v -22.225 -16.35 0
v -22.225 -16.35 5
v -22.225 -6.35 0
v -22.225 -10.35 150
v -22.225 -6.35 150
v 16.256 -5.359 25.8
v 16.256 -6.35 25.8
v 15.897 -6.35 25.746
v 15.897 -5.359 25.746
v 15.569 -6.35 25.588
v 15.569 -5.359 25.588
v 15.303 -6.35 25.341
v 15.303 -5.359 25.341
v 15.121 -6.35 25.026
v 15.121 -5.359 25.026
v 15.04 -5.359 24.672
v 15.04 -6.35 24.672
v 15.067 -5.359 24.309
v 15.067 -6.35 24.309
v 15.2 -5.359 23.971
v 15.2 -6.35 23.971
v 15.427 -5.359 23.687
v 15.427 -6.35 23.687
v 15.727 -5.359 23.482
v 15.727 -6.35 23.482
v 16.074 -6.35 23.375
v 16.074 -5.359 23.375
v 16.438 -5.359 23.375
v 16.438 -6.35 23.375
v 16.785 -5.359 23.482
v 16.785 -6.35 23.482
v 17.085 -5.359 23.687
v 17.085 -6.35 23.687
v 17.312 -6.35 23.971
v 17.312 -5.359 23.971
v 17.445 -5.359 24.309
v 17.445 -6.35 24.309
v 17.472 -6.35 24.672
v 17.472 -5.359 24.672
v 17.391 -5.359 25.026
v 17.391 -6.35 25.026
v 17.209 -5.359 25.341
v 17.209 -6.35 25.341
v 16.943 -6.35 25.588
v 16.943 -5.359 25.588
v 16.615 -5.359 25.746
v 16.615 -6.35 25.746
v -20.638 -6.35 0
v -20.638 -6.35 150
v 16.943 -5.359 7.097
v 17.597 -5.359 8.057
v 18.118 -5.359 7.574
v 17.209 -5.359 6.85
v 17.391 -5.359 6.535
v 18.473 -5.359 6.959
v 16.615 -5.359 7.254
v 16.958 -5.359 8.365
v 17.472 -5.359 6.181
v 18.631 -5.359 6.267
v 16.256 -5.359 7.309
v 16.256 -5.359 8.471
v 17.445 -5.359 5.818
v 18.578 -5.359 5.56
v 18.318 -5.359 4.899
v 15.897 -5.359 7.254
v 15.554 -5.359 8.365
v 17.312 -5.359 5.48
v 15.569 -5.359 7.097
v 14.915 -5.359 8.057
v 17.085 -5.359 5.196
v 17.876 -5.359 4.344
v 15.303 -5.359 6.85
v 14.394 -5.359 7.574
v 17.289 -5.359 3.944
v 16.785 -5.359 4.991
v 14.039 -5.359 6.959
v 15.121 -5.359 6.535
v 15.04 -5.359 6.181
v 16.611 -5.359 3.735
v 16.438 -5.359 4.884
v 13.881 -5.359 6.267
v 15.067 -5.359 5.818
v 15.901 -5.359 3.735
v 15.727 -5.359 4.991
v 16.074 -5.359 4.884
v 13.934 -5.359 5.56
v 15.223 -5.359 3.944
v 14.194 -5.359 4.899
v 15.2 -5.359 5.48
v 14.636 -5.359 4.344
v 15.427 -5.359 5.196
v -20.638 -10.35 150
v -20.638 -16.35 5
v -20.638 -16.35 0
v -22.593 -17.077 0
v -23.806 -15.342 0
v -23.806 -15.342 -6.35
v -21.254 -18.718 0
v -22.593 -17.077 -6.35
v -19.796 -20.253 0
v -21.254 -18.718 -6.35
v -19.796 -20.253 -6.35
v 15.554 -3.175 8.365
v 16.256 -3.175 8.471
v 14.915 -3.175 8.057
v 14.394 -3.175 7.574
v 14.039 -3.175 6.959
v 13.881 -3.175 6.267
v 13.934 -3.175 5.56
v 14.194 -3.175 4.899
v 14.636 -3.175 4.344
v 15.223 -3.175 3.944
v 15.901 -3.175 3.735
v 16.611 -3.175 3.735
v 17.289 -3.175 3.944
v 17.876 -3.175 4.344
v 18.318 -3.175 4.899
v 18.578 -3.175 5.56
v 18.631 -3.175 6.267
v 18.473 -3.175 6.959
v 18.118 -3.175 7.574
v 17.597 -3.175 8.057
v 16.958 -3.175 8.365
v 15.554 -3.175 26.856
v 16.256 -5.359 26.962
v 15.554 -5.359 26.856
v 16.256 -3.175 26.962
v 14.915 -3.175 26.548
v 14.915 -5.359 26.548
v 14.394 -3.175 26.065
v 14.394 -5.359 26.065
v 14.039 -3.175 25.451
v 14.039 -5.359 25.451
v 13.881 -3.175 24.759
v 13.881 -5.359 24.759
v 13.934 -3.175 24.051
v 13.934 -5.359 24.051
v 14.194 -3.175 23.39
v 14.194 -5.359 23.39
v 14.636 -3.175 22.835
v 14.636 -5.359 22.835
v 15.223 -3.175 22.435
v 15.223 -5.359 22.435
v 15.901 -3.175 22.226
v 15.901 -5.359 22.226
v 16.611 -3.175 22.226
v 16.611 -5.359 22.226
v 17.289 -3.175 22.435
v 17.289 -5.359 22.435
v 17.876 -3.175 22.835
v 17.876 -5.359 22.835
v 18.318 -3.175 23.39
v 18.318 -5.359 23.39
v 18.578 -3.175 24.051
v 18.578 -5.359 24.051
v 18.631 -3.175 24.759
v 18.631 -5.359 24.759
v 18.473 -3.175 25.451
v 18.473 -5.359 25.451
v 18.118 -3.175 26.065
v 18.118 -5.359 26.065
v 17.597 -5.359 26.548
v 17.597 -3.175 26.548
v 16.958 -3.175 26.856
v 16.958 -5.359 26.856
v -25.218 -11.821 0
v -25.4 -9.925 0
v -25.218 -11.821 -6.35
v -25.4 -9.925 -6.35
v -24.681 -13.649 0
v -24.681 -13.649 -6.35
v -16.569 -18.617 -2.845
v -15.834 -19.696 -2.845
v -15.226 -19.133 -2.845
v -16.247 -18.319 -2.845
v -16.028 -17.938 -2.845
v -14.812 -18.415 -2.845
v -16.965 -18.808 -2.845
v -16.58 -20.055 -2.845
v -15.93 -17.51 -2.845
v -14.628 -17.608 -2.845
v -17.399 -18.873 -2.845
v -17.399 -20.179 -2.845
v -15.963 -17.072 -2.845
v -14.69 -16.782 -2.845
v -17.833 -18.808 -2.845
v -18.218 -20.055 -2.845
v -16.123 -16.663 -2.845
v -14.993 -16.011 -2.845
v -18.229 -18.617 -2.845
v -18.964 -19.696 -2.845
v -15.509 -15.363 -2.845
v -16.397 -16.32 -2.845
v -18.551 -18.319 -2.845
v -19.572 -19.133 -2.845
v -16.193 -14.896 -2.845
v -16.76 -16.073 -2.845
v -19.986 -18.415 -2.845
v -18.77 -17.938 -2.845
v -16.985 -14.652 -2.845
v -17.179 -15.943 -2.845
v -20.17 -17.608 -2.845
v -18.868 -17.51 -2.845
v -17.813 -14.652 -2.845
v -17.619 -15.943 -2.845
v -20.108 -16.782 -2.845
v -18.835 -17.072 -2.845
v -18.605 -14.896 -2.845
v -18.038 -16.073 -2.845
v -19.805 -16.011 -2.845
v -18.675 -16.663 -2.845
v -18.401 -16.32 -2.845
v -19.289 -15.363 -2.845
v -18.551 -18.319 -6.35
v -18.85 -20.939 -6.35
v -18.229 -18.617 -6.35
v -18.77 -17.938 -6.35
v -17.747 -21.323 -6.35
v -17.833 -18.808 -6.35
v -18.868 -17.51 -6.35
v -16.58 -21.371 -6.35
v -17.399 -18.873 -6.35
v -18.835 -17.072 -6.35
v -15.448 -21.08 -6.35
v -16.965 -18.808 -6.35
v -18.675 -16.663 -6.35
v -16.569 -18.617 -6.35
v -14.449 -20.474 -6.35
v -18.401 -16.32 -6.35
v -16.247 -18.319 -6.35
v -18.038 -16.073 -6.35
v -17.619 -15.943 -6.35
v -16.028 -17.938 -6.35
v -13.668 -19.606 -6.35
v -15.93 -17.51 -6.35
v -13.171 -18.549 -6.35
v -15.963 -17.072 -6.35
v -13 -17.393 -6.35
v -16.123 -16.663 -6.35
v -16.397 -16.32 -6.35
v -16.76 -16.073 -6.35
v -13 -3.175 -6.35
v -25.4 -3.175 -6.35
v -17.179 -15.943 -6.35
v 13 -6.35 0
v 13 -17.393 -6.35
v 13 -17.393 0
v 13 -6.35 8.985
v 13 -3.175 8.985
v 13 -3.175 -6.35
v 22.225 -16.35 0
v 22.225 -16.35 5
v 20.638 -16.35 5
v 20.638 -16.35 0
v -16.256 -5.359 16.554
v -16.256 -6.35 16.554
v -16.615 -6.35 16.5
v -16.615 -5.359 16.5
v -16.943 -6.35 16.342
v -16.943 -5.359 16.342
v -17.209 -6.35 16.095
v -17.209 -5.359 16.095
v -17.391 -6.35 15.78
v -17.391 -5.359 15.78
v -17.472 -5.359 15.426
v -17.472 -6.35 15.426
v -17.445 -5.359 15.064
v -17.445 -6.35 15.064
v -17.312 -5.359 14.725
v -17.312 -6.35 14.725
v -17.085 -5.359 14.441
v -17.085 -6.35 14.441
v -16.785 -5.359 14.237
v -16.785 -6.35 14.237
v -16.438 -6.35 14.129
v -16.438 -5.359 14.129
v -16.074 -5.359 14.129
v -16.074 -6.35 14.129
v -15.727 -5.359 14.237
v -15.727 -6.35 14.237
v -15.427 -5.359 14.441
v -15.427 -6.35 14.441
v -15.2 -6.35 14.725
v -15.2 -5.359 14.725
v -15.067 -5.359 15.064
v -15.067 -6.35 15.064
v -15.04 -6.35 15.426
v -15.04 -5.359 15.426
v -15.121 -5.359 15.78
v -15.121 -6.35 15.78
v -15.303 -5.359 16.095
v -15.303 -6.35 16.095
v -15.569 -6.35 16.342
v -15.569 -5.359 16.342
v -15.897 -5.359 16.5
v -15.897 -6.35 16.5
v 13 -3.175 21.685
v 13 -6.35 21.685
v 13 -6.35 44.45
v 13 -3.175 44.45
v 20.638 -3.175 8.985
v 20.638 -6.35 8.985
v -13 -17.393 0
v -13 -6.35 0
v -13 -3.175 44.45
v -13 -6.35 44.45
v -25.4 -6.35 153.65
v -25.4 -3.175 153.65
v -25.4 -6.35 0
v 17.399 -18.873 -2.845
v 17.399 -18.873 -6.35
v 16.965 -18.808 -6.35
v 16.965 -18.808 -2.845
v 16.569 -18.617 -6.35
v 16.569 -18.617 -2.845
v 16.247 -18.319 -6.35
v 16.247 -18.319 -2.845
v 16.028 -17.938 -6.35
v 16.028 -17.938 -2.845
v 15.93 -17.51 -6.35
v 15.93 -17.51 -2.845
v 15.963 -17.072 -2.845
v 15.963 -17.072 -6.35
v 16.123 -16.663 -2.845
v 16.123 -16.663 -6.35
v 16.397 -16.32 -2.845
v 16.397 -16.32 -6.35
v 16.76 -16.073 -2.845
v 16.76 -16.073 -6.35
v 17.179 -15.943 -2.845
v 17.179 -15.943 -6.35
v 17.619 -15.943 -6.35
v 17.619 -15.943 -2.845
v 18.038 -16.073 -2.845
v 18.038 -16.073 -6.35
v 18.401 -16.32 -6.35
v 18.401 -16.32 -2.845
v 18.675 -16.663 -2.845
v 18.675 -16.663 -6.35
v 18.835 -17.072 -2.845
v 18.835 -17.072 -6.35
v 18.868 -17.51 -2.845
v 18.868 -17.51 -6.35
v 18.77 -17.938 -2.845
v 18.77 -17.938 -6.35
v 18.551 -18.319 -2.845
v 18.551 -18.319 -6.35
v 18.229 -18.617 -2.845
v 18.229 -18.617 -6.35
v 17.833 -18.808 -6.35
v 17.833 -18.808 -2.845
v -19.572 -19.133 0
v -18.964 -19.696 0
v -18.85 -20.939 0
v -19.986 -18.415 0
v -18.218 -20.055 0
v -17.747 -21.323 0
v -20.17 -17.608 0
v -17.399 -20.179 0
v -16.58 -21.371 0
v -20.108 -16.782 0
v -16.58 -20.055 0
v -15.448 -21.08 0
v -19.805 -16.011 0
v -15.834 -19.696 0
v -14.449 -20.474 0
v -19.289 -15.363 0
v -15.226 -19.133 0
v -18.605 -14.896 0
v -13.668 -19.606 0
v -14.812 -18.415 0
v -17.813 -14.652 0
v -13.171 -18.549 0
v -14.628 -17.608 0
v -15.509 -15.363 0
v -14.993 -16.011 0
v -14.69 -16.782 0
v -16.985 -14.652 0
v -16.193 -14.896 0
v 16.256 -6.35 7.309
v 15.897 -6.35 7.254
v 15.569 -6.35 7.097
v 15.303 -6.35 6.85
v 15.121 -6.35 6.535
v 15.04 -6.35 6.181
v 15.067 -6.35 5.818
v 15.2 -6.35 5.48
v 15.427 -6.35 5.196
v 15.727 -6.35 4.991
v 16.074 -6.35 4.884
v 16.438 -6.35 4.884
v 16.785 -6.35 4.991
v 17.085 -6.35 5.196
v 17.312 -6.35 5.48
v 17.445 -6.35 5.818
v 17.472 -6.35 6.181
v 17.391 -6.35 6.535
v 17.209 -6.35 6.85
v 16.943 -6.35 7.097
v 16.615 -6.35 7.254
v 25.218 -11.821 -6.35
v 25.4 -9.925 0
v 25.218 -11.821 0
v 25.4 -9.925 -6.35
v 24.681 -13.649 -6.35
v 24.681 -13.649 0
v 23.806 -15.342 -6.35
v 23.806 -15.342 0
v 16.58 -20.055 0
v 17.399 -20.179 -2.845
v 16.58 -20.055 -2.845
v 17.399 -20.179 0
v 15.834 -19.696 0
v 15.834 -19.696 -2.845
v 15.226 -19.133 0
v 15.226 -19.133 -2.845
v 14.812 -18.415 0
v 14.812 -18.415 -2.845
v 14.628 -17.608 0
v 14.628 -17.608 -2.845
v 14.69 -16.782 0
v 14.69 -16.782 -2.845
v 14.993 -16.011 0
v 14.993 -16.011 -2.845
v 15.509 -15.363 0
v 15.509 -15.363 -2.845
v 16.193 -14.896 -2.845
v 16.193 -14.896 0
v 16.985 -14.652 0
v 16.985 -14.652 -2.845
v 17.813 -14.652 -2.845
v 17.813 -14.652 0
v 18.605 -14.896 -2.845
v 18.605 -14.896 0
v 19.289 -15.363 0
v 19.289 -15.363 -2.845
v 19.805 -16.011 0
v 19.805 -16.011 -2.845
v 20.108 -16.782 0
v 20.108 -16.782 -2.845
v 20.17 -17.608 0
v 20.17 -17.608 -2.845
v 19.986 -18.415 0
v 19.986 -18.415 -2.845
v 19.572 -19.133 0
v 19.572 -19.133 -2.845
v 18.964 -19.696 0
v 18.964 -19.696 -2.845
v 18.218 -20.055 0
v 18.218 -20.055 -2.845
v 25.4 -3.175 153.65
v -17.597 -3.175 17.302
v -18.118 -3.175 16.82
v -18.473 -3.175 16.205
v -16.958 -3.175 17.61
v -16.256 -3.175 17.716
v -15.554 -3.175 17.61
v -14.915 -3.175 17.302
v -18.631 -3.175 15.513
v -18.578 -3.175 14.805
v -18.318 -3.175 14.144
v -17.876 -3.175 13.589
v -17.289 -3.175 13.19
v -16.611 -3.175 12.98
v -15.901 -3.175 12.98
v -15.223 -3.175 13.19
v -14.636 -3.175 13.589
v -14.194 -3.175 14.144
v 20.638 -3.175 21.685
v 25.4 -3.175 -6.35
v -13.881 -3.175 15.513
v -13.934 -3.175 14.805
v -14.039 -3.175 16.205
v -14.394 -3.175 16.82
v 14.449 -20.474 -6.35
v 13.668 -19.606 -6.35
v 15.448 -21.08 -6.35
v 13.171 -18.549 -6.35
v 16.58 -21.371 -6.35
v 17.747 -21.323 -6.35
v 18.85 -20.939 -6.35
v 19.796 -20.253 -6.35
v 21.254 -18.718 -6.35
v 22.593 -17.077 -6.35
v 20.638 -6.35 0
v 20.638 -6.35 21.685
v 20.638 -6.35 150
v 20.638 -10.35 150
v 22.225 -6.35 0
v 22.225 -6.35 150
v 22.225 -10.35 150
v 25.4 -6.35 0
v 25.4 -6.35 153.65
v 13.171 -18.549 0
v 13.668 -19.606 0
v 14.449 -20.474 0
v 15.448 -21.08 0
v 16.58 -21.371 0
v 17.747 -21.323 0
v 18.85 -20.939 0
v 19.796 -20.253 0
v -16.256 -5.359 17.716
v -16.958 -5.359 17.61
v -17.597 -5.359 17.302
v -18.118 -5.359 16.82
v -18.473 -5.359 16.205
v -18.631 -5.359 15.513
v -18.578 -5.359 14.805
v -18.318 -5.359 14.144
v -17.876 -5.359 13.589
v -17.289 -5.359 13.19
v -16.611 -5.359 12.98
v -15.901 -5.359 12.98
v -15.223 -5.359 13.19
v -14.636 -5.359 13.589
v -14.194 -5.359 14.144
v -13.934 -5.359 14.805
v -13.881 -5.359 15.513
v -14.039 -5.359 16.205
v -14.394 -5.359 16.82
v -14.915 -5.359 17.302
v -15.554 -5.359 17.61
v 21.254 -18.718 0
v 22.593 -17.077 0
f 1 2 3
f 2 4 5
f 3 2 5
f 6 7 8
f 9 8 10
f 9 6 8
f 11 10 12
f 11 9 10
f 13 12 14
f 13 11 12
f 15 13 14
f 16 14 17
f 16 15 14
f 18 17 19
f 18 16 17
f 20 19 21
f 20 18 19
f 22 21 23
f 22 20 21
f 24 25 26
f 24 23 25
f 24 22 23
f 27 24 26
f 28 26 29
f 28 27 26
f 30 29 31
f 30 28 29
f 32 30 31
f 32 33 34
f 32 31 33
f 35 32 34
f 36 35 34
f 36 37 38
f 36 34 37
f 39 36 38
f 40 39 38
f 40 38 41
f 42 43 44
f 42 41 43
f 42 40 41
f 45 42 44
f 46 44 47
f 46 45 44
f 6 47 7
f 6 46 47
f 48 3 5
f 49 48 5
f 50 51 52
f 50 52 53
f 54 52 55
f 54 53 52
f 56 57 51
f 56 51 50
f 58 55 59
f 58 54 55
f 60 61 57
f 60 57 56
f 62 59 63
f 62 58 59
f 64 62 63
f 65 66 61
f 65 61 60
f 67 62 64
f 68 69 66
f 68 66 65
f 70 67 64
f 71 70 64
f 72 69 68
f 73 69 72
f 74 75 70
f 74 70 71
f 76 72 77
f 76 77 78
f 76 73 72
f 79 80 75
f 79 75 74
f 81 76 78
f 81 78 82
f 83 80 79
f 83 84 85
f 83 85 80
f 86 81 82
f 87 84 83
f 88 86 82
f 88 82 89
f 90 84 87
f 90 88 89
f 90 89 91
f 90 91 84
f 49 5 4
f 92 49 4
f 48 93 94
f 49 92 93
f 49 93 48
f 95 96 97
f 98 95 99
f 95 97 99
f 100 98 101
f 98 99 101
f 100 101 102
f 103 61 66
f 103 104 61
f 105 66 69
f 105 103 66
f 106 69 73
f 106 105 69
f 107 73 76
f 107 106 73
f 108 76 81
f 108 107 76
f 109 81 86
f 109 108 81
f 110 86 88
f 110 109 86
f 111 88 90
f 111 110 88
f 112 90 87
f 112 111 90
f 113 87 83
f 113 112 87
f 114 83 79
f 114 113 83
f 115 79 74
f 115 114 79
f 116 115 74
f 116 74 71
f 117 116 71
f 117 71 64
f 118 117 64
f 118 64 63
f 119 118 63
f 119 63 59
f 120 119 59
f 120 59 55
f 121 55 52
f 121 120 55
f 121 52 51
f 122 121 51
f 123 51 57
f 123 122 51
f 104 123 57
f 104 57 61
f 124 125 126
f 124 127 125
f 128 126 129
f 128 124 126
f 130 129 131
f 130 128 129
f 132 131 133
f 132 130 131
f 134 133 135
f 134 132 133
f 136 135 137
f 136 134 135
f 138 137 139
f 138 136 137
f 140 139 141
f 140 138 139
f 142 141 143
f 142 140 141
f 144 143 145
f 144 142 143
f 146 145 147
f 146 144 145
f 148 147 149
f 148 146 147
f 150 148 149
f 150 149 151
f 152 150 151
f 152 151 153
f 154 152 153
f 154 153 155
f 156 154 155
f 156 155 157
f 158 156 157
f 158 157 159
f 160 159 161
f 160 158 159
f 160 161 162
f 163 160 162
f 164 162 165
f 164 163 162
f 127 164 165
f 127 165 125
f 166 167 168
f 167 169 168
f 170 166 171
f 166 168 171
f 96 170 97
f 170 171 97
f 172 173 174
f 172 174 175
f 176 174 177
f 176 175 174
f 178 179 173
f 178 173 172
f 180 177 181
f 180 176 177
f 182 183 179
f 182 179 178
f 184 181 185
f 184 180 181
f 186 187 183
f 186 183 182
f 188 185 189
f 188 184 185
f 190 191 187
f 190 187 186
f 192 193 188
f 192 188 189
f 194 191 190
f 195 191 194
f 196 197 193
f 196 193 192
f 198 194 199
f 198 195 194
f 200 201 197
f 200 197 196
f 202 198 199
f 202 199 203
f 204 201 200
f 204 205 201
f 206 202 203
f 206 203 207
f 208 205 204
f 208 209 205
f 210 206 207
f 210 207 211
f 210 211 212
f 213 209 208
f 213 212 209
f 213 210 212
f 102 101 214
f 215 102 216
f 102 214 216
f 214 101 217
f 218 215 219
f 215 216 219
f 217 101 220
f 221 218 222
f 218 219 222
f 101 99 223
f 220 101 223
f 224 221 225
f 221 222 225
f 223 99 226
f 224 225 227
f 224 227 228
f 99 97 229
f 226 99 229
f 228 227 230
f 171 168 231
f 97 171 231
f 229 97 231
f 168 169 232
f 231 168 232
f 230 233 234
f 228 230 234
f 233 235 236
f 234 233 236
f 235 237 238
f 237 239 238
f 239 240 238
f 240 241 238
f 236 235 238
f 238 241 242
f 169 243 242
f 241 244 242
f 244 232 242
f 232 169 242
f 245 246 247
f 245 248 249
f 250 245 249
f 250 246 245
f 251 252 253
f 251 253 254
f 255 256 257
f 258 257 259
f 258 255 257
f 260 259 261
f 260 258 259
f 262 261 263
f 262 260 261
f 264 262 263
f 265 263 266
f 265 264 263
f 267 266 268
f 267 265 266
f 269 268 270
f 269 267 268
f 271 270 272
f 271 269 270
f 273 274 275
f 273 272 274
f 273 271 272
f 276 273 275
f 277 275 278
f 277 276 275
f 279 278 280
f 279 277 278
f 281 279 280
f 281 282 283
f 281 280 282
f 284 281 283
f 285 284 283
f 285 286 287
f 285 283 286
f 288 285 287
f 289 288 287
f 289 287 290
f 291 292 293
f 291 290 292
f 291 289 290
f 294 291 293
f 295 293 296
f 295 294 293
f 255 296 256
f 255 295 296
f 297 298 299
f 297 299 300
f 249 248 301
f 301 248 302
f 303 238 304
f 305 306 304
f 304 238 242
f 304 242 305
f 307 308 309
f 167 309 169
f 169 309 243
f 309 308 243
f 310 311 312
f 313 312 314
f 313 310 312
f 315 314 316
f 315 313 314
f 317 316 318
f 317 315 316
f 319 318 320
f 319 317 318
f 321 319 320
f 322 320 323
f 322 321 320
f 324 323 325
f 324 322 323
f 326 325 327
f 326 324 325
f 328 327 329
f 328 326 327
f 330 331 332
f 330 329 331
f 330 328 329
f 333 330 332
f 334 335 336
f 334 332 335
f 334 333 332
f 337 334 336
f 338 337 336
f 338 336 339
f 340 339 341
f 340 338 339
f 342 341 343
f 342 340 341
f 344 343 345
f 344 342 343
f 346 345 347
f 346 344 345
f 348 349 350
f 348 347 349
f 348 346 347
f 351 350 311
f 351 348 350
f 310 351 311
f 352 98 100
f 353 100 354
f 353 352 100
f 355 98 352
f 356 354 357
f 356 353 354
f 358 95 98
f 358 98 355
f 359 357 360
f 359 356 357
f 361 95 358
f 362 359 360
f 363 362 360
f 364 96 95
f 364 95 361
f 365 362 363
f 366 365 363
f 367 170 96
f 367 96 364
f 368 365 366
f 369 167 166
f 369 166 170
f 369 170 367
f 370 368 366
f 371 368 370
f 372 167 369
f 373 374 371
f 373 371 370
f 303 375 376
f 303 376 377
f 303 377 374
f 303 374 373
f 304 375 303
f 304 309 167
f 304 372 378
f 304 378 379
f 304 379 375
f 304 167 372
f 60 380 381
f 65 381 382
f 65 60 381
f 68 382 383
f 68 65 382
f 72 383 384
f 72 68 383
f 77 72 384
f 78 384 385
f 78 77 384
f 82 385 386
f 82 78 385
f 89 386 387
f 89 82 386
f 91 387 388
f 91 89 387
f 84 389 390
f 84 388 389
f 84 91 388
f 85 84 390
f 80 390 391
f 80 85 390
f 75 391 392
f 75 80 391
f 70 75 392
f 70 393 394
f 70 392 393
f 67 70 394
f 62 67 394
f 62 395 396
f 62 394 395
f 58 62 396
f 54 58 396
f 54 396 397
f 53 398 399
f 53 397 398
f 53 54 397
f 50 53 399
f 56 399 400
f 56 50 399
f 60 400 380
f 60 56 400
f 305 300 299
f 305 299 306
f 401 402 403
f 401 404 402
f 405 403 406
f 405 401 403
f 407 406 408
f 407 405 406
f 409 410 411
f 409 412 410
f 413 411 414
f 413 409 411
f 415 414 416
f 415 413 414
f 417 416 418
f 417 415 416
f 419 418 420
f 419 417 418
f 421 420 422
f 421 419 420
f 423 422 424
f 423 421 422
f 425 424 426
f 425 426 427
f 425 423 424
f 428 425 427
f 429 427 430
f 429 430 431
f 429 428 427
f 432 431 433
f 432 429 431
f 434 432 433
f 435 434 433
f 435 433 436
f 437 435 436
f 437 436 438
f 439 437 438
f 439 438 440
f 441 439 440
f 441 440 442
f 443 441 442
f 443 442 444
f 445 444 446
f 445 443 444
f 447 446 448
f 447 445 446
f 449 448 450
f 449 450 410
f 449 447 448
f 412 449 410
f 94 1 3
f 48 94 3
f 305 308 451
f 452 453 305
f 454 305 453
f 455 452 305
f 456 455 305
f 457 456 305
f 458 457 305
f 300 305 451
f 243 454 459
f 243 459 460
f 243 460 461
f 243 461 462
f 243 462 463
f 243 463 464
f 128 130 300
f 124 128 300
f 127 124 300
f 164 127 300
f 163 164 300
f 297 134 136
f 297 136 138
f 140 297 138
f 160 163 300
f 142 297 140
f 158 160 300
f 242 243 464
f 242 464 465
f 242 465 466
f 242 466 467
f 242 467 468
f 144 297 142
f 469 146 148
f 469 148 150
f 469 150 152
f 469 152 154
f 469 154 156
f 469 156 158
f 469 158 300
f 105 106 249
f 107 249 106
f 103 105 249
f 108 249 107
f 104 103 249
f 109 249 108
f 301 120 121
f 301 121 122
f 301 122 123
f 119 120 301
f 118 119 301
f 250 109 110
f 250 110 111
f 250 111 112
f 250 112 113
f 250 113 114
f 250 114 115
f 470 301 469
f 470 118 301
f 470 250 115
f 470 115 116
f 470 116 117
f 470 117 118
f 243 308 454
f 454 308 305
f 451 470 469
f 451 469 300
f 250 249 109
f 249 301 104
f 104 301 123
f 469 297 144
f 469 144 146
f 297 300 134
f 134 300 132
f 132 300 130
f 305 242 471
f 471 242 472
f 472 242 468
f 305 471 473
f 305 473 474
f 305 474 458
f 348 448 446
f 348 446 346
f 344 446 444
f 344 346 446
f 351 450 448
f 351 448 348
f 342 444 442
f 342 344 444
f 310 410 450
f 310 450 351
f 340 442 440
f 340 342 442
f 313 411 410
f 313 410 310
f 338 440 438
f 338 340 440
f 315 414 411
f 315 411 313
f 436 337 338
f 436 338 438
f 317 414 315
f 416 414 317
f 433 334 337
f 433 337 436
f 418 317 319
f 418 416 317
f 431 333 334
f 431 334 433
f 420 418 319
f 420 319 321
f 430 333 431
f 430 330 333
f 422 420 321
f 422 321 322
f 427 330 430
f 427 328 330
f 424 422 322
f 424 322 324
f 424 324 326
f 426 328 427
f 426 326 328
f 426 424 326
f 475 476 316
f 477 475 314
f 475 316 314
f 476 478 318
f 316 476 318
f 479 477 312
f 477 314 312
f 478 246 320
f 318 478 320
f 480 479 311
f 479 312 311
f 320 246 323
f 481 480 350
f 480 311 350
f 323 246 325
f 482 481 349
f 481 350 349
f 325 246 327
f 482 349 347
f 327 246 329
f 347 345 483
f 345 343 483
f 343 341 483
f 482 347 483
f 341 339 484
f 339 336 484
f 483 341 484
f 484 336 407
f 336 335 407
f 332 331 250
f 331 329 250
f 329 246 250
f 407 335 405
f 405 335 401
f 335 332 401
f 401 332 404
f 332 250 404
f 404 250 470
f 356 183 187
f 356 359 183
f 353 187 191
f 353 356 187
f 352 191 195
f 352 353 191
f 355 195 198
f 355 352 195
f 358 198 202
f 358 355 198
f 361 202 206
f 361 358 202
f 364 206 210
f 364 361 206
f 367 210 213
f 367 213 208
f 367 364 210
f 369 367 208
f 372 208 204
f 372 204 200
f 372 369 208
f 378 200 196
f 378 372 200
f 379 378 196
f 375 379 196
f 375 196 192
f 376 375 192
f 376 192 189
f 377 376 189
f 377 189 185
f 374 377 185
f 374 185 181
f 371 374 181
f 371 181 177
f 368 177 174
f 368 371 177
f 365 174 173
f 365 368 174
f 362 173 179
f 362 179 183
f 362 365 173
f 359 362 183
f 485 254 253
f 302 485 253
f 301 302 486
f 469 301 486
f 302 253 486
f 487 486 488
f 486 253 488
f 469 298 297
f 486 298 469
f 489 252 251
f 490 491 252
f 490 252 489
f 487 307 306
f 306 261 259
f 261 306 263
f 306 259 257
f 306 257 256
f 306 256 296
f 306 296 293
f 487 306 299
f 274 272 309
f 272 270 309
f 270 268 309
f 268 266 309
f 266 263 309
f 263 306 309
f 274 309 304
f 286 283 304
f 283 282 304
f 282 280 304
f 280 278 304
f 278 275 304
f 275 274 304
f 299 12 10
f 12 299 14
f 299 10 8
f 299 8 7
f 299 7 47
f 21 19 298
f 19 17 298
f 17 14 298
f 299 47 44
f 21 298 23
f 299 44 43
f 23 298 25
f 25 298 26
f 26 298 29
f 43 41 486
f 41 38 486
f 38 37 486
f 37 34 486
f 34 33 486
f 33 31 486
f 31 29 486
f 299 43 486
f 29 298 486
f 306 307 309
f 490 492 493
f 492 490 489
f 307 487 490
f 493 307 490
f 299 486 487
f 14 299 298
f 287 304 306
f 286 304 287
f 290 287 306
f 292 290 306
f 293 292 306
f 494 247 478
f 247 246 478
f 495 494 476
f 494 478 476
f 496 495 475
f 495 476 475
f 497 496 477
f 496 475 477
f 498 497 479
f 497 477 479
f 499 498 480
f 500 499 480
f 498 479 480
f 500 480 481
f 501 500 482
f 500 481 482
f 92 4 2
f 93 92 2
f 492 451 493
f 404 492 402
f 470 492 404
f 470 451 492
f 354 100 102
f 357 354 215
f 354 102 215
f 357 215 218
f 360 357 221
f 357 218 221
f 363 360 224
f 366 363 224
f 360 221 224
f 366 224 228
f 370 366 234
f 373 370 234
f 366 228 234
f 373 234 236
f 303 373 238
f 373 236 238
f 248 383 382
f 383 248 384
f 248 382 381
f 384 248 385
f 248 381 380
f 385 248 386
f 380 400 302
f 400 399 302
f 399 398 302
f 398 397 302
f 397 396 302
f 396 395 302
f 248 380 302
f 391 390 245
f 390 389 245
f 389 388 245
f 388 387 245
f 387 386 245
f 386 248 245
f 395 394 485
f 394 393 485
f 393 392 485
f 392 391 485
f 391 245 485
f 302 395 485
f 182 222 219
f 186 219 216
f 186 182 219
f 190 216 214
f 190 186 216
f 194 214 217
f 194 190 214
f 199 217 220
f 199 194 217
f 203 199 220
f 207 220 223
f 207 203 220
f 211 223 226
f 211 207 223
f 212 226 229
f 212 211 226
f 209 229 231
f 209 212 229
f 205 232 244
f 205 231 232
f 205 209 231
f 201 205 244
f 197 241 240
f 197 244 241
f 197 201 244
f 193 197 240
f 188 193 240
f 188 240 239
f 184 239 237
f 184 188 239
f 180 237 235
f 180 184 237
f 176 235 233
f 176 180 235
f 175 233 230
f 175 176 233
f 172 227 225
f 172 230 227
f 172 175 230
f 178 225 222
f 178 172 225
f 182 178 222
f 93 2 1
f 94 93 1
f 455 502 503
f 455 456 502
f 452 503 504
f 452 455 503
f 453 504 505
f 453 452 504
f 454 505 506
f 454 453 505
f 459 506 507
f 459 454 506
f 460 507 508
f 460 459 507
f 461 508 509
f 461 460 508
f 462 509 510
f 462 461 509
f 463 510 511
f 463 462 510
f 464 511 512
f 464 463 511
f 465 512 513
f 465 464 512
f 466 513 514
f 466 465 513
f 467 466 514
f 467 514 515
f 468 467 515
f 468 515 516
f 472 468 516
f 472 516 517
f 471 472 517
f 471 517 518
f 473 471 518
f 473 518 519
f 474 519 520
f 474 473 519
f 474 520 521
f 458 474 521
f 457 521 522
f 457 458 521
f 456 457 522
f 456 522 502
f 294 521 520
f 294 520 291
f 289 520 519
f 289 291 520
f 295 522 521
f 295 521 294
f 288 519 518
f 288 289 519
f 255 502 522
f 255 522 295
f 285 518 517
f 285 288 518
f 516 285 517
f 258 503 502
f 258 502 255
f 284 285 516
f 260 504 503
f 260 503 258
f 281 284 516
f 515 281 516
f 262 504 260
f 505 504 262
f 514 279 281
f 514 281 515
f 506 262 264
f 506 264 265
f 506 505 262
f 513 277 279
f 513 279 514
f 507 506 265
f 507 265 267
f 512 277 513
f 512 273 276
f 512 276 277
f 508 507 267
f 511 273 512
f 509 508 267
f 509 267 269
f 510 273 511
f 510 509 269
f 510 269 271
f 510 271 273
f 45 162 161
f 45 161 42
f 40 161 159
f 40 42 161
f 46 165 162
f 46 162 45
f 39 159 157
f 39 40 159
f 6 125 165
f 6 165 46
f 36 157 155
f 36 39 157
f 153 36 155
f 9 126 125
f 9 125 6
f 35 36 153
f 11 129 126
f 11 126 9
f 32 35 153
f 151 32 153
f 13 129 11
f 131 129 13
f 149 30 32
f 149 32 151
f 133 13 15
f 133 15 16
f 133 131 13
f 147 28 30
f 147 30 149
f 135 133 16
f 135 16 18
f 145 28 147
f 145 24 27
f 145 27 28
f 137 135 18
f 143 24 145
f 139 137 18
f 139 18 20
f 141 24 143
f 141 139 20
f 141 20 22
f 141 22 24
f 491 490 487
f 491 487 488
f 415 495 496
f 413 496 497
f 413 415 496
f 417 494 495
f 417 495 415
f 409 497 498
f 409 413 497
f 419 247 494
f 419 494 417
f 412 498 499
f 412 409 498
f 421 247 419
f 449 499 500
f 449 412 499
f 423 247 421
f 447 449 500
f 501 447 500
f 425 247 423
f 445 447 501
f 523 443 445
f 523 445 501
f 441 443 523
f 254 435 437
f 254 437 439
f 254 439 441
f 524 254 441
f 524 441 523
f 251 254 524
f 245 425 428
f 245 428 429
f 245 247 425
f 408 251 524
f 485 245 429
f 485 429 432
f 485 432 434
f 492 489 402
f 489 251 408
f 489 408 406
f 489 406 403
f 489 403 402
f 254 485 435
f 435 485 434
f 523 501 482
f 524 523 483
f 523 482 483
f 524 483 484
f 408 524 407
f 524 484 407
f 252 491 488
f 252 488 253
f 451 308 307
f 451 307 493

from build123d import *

# Parameters (mm, degrees)
SKETCH1_W                                     = 50.8
SKETCH1_H                                     = 25.4
BASE_FLANGE1_DEPTH                            = 6.35
SKETCH22_W                                    = 50.8
SKETCH22_H                                    = 160
BOSS_EXTRUDE1_DEPTH                           = 3.175
GUSSET1_START                                 = -22.225
GUSSET1_DEPTH                                 = 1.5875
CBORE_FOR_4_SOCKET_HEAD_CAP_SCREW1_AT_2_COUNT = 2
CBORE_FOR_4_SOCKET_HEAD_CAP_SCREW1_AT_2_PITCH = 34.798
SKETCH12_W                                    = 26
SKETCH12_H                                    = 28.575
CUT_EXTRUDE1_DEPTH                            = 50.8
SKETCH13_W                                    = 33.6375
SKETCH13_H                                    = 12.7
CUT_EXTRUDE2_DEPTH                            = 50.8
CBORE_FOR_2_SOCKET_HEAD_CAP_SCREW1_AT_2_COUNT = 2
CBORE_FOR_2_SOCKET_HEAD_CAP_SCREW1_AT_2_PITCH = 33.801054175
CBORE_FOR_2_SOCKET_HEAD_CAP_SCREW1_AT_3_COUNT = 2
CBORE_FOR_2_SOCKET_HEAD_CAP_SCREW1_AT_3_PITCH = 33.801054175
SKETCH17_OUTSIDE_W                            = 86.756
SKETCH17_OUTSIDE_H                            = 61.356
SKETCH17_OUTSIDE_R                            = 28.321
CUT_EXTRUDE3_DEPTH                            = 165.504378741
FILLET1_R                                     = 10
FILLET2_R                                     = 4


# Read off the part's stored shape, not the designer's step: Gusset1
# Sheet-metal steps are written as plain solids
with BuildPart() as part:
    # Sketch1 → Base-Flange1 (new body)
    with BuildSketch(Plane.XY):
        with Locations((0, -15.875)):
            Rectangle(SKETCH1_W, SKETCH1_H)
    extrude(amount=-BASE_FLANGE1_DEPTH)

    # Sketch22 → Boss-Extrude1 (add)
    with BuildSketch(Plane(origin=(0, -3.175, 0), x_dir=(1, 0, 0), z_dir=(0, 1, 0))):
        with Locations((0, -73.65)):
            Rectangle(SKETCH22_W, SKETCH22_H)
    extrude(amount=-BOSS_EXTRUDE1_DEPTH)

    # Sketch11 → CBORE for #4 Socket Head Cap Screw1 (revolve, cut)
    with BuildSketch(Plane(origin=(-17.399, -17.4, 0), x_dir=(0, -1, 0), z_dir=(1, 0, 0))):
        Polygon((0, 0), (0, 6.351), (1.4732, 6.351), (1.4732, 2.8448), (2.77876, 2.8448), (2.77876, 0), align=None)
    cbore_for_4_socket_head_cap_screw1 = revolve(axis=Axis((-17.399, -17.4, 6.35), (0, 0, -1)), mode=Mode.SUBTRACT)

    # CBORE for #4 Socket Head Cap Screw1 at 2: CBORE for #4 Socket Head Cap Screw1 ×2
    with Locations(*[(i * CBORE_FOR_4_SOCKET_HEAD_CAP_SCREW1_AT_2_PITCH, 0, 0) for i in range(1, CBORE_FOR_4_SOCKET_HEAD_CAP_SCREW1_AT_2_COUNT)]):
        add(cbore_for_4_socket_head_cap_screw1, mode=Mode.SUBTRACT)

    # Sketch12 → Cut-Extrude1 (cut)
    with BuildSketch(Plane(origin=(0, 0, -6.35), x_dir=(-1, 0, 0), z_dir=(0, 0, -1))):
        with Locations((0, -14.2875)):
            Rectangle(SKETCH12_W, SKETCH12_H)
    extrude(amount=-CUT_EXTRUDE1_DEPTH, mode=Mode.SUBTRACT)


with BuildPart() as body_2:
    # Gusset1 outline → Gusset1 (new body)
    with BuildSketch(Plane.YZ.offset(GUSSET1_START)):
        Polygon((-16.35, 5), (-16.35, 0), (-6.35, 0), (-6.35, 150), (-10.35, 150), align=None)
    gusset1 = extrude(amount=GUSSET1_DEPTH)


with BuildPart() as part_1:
    add(part.part)

    # Mirror2: Gusset1 across plane
    add(gusset1.mirror(Plane(origin=(0, 0, 0), x_dir=(0, 0, 1), z_dir=(1, 0, 0))))

    # Sketch13 → Cut-Extrude2 (cut)
    with BuildSketch(Plane.XZ.offset(6.35)):
        with Locations((3.81875, 15.335)):
            Rectangle(SKETCH13_W, SKETCH13_H)
    extrude(amount=-CUT_EXTRUDE2_DEPTH, mode=Mode.SUBTRACT)

    # Sketch16 → CBORE for #2 Socket Head Cap Screw1 (revolve, cut)
    with BuildSketch(Plane(origin=(-16.256, -3.175, 15.335), x_dir=(0, 0, 1), z_dir=(1, 0, 0))):
        Polygon((0, 0), (0, 17.242569267), (1.2192, 16.51), (1.2192, 2.1844), (2.38125, 2.1844), (2.38125, 0), align=None)
    cbore_for_2_socket_head_cap_screw1 = revolve(axis=Axis((-16.256, 3.175, 15.335), (0, -1, 0)), mode=Mode.SUBTRACT)

    # CBORE for #2 Socket Head Cap Screw1 at 2: CBORE for #2 Socket Head Cap Screw1 ×2
    with Locations(*[Vector(0.9618634919315714, 0, 0.27352993051804053) * (i * CBORE_FOR_2_SOCKET_HEAD_CAP_SCREW1_AT_2_PITCH) for i in range(1, CBORE_FOR_2_SOCKET_HEAD_CAP_SCREW1_AT_2_COUNT)]):
        add(cbore_for_2_socket_head_cap_screw1, mode=Mode.SUBTRACT)

    # CBORE for #2 Socket Head Cap Screw1 at 3: CBORE for #2 Socket Head Cap Screw1 ×2
    with Locations(*[Vector(0.9618634919315714, 0, -0.2735299305180405) * (i * CBORE_FOR_2_SOCKET_HEAD_CAP_SCREW1_AT_3_PITCH) for i in range(1, CBORE_FOR_2_SOCKET_HEAD_CAP_SCREW1_AT_3_COUNT)]):
        add(cbore_for_2_socket_head_cap_screw1, mode=Mode.SUBTRACT)

    # Sketch17 outside → Cut-Extrude3 (cut, through all)
    with BuildSketch(Plane(origin=(0, 0, -6.35), x_dir=(-1, 0, 0), z_dir=(0, 0, -1))):
        with Locations((0, -15.875)):
            Rectangle(SKETCH17_OUTSIDE_W, SKETCH17_OUTSIDE_H)
        Circle(SKETCH17_OUTSIDE_R, mode=Mode.SUBTRACT)
    extrude(amount=-CUT_EXTRUDE3_DEPTH, mode=Mode.SUBTRACT)

    # Fillet1
    fillet1_edges = [part_1.edges().sort_by_distance(p)[0] for p in [
        (25.4, -12.526733054, -3.175),
        (-25.4, -12.526733054, -3.175),
    ]]
    fillet(fillet1_edges, radius=FILLET1_R)

    # Fillet2
    fillet2_edges = [part_1.edges().sort_by_distance(p)[0] for p in [
        (-13, -25.161062001, -3.175),
        (13, -25.161062001, -3.175),
    ]]
    fillet(fillet2_edges, radius=FILLET2_R)


solid = Compound([body_2.part, part_1.part])
